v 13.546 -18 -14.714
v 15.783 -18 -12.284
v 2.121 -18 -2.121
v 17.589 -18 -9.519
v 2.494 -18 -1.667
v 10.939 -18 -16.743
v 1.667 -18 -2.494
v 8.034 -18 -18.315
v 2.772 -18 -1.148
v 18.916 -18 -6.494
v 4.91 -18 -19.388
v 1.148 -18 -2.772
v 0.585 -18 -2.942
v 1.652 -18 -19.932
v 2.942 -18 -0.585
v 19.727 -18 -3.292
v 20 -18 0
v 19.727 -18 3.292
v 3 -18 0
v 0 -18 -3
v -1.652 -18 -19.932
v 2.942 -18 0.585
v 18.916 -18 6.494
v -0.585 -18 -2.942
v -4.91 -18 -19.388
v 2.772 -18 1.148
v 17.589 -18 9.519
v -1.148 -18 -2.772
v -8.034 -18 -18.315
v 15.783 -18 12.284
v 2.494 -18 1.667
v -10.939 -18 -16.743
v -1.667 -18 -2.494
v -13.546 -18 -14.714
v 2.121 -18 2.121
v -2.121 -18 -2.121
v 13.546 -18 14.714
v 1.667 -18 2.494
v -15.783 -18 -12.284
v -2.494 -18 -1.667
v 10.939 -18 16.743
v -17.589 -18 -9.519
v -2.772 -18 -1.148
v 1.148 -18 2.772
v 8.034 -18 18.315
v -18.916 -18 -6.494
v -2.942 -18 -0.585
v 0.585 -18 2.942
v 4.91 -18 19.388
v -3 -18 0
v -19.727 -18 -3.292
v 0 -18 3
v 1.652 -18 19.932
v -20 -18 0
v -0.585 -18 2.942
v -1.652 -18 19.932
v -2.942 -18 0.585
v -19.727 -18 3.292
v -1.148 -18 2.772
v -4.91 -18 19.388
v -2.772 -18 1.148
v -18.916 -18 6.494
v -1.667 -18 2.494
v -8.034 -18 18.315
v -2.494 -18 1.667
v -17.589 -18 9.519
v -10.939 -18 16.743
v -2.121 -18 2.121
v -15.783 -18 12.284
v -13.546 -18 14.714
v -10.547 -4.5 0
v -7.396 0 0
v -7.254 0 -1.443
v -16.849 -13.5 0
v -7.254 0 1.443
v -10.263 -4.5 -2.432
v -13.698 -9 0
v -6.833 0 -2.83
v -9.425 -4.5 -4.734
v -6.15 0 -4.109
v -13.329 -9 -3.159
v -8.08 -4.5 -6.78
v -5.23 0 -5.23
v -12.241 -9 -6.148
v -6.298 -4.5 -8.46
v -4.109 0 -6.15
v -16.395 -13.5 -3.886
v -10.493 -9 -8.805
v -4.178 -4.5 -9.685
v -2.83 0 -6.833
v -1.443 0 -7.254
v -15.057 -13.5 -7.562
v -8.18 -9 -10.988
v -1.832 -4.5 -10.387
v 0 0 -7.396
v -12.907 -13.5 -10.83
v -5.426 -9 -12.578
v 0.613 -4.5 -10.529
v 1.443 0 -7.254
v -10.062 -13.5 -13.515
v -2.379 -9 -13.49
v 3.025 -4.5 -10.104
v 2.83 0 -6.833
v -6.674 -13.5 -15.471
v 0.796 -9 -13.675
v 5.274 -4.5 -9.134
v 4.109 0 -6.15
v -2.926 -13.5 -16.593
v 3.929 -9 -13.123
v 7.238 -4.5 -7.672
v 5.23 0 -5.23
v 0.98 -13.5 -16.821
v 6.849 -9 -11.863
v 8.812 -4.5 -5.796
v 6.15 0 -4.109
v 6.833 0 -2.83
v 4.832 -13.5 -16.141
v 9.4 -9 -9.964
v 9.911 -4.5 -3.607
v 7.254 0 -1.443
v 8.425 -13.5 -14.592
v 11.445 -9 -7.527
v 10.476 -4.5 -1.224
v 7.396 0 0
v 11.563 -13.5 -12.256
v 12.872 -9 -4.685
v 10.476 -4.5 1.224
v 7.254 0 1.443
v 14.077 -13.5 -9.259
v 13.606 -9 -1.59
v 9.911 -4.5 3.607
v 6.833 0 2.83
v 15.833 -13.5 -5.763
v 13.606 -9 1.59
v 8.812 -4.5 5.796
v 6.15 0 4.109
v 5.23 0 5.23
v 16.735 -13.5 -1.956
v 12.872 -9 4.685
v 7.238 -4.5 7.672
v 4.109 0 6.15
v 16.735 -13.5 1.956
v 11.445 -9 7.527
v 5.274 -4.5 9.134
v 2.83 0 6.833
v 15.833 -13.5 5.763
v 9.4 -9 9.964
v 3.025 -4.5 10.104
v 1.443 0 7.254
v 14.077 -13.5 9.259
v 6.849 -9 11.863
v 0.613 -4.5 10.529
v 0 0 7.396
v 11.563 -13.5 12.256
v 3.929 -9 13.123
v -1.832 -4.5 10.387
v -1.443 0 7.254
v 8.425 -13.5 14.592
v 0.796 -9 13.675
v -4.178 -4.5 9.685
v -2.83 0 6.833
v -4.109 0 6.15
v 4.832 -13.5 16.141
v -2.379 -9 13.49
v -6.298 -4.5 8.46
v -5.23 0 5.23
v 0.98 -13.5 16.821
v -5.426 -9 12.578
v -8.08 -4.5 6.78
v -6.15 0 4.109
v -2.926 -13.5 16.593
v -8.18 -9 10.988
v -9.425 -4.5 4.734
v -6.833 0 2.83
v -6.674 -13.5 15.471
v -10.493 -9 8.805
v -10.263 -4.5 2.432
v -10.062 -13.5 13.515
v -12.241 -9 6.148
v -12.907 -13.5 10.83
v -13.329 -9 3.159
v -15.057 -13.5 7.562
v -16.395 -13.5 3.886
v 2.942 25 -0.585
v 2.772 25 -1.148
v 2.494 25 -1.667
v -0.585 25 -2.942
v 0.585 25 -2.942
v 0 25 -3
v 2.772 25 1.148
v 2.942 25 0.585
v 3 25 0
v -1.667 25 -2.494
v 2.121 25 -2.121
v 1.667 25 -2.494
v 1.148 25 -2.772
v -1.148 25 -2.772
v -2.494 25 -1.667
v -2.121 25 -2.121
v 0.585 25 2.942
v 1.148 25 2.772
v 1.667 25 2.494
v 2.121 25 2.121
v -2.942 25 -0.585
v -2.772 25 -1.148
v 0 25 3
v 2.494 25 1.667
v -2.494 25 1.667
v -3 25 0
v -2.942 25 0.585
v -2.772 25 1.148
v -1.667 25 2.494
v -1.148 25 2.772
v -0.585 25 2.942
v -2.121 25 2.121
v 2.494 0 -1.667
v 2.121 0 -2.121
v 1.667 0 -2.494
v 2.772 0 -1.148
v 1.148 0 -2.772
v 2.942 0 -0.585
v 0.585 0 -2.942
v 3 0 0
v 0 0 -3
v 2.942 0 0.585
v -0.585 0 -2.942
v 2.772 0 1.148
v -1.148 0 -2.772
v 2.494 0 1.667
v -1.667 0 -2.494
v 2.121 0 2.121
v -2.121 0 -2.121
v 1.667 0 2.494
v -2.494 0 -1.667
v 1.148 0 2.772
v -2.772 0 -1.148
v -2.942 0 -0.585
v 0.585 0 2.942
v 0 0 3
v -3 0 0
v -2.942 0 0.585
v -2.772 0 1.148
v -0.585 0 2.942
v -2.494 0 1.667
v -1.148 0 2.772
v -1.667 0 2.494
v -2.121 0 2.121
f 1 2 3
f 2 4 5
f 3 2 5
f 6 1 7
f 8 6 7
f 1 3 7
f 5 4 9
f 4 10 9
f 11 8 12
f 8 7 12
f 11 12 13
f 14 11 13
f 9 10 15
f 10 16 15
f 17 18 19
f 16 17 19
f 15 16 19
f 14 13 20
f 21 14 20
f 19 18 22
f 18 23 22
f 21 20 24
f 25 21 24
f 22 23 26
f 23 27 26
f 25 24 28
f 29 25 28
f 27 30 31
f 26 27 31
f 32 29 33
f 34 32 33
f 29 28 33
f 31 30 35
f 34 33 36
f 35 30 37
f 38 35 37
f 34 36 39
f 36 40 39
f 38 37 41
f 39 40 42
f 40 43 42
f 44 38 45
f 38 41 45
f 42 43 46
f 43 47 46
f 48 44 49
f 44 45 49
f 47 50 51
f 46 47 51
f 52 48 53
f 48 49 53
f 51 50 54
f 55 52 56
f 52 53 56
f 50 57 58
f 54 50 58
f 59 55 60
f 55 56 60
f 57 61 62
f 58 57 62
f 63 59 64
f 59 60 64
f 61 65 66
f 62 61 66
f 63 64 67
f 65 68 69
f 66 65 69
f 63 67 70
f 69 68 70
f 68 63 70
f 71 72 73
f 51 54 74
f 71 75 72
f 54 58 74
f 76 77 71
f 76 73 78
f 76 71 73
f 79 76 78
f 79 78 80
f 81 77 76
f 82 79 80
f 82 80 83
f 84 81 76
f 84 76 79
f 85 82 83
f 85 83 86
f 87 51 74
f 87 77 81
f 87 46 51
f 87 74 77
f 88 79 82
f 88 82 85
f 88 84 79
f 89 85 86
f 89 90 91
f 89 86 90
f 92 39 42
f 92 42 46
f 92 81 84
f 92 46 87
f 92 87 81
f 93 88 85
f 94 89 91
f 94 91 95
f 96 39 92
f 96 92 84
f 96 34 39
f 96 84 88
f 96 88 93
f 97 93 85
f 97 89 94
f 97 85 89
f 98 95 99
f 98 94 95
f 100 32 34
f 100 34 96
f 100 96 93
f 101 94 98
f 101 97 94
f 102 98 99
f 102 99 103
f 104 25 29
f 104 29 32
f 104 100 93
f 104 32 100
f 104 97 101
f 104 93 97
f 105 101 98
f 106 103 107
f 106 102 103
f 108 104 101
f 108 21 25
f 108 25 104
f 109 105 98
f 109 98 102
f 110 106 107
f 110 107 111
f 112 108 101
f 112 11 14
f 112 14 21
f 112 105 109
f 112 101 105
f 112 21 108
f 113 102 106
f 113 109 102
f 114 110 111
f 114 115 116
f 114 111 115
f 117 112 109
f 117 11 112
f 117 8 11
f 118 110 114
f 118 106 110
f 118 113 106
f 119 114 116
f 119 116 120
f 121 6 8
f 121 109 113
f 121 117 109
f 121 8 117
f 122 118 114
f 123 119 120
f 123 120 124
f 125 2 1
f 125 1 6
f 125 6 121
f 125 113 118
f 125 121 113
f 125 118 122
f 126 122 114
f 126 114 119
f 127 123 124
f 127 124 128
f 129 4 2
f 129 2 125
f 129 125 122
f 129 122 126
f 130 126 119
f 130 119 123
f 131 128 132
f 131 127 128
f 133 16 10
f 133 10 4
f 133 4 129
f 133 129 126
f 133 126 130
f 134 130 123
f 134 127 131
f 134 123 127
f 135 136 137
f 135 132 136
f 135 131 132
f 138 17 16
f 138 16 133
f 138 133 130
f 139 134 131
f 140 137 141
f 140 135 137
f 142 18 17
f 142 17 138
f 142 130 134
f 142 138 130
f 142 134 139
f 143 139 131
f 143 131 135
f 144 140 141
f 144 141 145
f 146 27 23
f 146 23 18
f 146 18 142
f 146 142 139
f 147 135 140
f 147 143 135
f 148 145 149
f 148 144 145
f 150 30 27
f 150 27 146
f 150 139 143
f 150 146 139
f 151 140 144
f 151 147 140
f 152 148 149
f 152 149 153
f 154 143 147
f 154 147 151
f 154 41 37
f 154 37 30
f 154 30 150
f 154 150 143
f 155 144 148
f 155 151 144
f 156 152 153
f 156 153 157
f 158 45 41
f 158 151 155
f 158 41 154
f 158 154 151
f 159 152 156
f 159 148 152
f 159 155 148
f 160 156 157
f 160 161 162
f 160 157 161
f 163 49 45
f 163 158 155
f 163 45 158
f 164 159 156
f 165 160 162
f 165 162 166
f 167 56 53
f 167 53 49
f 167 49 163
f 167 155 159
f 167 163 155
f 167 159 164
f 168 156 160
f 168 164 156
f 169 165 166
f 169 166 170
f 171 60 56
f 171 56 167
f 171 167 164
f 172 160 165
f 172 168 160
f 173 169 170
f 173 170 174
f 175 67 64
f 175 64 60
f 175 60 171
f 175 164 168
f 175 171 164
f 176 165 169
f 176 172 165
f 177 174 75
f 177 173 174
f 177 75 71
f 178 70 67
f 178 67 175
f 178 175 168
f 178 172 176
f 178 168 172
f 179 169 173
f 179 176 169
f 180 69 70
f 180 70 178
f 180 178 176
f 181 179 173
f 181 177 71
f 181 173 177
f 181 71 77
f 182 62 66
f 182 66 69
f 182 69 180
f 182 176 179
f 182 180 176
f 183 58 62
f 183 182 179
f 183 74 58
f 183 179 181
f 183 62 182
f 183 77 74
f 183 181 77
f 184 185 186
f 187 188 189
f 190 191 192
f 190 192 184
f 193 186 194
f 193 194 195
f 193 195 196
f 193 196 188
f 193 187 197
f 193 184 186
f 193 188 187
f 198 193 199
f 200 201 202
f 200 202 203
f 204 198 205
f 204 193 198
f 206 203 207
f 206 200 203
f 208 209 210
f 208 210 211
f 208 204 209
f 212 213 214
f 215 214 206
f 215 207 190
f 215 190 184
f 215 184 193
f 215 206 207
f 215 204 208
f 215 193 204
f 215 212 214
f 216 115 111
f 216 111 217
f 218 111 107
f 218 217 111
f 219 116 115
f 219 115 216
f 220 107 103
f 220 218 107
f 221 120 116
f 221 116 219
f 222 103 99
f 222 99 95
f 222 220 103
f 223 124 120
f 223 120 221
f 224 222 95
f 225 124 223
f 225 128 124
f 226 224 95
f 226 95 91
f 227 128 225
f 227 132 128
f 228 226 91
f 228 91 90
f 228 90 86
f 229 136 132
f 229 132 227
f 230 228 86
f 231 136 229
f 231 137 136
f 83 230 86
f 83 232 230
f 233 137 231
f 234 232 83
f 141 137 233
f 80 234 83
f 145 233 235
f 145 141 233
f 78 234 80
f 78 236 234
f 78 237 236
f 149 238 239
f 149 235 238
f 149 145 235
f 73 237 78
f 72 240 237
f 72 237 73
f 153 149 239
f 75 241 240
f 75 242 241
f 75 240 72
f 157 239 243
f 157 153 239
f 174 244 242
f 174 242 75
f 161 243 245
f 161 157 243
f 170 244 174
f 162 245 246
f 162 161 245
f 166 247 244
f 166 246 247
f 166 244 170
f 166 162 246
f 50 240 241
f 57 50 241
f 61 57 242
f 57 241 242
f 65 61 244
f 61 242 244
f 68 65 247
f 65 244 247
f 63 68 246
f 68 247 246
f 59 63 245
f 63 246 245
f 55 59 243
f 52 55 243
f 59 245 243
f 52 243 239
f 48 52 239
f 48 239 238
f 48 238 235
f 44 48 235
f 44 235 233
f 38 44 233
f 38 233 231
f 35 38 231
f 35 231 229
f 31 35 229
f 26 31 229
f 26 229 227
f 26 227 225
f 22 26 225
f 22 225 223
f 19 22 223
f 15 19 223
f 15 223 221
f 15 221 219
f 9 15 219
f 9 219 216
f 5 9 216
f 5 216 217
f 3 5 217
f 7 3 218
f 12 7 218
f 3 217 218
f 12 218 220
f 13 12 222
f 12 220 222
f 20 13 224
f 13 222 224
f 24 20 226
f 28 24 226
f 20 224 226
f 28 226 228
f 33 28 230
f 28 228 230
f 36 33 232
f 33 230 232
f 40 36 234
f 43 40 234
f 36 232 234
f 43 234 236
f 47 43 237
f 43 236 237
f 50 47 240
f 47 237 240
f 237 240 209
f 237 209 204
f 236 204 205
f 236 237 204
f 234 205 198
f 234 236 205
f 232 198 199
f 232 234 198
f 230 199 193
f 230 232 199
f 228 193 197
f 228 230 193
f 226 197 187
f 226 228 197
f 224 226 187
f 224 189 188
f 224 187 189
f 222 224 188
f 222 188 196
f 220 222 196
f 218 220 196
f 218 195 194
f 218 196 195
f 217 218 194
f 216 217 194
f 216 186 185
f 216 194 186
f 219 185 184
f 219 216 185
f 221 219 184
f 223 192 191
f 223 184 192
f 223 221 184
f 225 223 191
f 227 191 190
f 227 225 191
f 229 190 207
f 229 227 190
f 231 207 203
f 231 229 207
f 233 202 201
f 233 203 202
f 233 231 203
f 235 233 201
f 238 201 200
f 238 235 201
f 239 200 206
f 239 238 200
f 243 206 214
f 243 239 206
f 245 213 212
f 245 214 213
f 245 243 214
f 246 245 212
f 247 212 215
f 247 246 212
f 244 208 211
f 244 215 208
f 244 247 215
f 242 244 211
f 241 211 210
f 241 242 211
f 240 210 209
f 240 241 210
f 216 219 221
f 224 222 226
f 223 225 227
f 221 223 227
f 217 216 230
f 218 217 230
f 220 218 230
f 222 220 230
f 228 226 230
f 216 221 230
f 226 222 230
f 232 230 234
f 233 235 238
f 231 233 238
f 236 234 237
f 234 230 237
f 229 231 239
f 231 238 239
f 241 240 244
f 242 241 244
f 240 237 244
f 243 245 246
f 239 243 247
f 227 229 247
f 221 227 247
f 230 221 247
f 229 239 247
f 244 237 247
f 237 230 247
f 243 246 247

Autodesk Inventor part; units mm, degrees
ref_plane "YZ Plane" through (0, 0, 0) normal (1, 0, 0) x (0, 1, 0)
ref_plane "XZ Plane" through (0, 0, 0) normal (0, 1, 0) x (-1, 0, 0)
ref_plane "XY Plane" through (0, 0, 0) normal (0, 0, 1) x (1, 0, 0)
sketch "Boceto1" plane through (0, 0, 0) normal (0, 1, 0) x (-1, 0, 0)
  circle A0 centre (0, 0) radius 20
  circle A1 centre (0, 0) radius 3
  dimension "d0" = 40
  dimension "d1" = 6
extrude "Extrusión1" add sketch "Boceto1" along normal blind 25 contours A1
extrude "Extrusión2" add sketch "Boceto1" against normal blind 18
draft "Cara para el ángulo de desmoldeo1" angle -35 pull direction (0, -1, 0) faces at (-19.9351, -12, -1.6093) fixed edges at (20, -18, 0)
thread "Rosca1" size "M6x1" class "6g" standard "ANSI Metric M Profile" full length
properties part number "Pata regulable M6"
